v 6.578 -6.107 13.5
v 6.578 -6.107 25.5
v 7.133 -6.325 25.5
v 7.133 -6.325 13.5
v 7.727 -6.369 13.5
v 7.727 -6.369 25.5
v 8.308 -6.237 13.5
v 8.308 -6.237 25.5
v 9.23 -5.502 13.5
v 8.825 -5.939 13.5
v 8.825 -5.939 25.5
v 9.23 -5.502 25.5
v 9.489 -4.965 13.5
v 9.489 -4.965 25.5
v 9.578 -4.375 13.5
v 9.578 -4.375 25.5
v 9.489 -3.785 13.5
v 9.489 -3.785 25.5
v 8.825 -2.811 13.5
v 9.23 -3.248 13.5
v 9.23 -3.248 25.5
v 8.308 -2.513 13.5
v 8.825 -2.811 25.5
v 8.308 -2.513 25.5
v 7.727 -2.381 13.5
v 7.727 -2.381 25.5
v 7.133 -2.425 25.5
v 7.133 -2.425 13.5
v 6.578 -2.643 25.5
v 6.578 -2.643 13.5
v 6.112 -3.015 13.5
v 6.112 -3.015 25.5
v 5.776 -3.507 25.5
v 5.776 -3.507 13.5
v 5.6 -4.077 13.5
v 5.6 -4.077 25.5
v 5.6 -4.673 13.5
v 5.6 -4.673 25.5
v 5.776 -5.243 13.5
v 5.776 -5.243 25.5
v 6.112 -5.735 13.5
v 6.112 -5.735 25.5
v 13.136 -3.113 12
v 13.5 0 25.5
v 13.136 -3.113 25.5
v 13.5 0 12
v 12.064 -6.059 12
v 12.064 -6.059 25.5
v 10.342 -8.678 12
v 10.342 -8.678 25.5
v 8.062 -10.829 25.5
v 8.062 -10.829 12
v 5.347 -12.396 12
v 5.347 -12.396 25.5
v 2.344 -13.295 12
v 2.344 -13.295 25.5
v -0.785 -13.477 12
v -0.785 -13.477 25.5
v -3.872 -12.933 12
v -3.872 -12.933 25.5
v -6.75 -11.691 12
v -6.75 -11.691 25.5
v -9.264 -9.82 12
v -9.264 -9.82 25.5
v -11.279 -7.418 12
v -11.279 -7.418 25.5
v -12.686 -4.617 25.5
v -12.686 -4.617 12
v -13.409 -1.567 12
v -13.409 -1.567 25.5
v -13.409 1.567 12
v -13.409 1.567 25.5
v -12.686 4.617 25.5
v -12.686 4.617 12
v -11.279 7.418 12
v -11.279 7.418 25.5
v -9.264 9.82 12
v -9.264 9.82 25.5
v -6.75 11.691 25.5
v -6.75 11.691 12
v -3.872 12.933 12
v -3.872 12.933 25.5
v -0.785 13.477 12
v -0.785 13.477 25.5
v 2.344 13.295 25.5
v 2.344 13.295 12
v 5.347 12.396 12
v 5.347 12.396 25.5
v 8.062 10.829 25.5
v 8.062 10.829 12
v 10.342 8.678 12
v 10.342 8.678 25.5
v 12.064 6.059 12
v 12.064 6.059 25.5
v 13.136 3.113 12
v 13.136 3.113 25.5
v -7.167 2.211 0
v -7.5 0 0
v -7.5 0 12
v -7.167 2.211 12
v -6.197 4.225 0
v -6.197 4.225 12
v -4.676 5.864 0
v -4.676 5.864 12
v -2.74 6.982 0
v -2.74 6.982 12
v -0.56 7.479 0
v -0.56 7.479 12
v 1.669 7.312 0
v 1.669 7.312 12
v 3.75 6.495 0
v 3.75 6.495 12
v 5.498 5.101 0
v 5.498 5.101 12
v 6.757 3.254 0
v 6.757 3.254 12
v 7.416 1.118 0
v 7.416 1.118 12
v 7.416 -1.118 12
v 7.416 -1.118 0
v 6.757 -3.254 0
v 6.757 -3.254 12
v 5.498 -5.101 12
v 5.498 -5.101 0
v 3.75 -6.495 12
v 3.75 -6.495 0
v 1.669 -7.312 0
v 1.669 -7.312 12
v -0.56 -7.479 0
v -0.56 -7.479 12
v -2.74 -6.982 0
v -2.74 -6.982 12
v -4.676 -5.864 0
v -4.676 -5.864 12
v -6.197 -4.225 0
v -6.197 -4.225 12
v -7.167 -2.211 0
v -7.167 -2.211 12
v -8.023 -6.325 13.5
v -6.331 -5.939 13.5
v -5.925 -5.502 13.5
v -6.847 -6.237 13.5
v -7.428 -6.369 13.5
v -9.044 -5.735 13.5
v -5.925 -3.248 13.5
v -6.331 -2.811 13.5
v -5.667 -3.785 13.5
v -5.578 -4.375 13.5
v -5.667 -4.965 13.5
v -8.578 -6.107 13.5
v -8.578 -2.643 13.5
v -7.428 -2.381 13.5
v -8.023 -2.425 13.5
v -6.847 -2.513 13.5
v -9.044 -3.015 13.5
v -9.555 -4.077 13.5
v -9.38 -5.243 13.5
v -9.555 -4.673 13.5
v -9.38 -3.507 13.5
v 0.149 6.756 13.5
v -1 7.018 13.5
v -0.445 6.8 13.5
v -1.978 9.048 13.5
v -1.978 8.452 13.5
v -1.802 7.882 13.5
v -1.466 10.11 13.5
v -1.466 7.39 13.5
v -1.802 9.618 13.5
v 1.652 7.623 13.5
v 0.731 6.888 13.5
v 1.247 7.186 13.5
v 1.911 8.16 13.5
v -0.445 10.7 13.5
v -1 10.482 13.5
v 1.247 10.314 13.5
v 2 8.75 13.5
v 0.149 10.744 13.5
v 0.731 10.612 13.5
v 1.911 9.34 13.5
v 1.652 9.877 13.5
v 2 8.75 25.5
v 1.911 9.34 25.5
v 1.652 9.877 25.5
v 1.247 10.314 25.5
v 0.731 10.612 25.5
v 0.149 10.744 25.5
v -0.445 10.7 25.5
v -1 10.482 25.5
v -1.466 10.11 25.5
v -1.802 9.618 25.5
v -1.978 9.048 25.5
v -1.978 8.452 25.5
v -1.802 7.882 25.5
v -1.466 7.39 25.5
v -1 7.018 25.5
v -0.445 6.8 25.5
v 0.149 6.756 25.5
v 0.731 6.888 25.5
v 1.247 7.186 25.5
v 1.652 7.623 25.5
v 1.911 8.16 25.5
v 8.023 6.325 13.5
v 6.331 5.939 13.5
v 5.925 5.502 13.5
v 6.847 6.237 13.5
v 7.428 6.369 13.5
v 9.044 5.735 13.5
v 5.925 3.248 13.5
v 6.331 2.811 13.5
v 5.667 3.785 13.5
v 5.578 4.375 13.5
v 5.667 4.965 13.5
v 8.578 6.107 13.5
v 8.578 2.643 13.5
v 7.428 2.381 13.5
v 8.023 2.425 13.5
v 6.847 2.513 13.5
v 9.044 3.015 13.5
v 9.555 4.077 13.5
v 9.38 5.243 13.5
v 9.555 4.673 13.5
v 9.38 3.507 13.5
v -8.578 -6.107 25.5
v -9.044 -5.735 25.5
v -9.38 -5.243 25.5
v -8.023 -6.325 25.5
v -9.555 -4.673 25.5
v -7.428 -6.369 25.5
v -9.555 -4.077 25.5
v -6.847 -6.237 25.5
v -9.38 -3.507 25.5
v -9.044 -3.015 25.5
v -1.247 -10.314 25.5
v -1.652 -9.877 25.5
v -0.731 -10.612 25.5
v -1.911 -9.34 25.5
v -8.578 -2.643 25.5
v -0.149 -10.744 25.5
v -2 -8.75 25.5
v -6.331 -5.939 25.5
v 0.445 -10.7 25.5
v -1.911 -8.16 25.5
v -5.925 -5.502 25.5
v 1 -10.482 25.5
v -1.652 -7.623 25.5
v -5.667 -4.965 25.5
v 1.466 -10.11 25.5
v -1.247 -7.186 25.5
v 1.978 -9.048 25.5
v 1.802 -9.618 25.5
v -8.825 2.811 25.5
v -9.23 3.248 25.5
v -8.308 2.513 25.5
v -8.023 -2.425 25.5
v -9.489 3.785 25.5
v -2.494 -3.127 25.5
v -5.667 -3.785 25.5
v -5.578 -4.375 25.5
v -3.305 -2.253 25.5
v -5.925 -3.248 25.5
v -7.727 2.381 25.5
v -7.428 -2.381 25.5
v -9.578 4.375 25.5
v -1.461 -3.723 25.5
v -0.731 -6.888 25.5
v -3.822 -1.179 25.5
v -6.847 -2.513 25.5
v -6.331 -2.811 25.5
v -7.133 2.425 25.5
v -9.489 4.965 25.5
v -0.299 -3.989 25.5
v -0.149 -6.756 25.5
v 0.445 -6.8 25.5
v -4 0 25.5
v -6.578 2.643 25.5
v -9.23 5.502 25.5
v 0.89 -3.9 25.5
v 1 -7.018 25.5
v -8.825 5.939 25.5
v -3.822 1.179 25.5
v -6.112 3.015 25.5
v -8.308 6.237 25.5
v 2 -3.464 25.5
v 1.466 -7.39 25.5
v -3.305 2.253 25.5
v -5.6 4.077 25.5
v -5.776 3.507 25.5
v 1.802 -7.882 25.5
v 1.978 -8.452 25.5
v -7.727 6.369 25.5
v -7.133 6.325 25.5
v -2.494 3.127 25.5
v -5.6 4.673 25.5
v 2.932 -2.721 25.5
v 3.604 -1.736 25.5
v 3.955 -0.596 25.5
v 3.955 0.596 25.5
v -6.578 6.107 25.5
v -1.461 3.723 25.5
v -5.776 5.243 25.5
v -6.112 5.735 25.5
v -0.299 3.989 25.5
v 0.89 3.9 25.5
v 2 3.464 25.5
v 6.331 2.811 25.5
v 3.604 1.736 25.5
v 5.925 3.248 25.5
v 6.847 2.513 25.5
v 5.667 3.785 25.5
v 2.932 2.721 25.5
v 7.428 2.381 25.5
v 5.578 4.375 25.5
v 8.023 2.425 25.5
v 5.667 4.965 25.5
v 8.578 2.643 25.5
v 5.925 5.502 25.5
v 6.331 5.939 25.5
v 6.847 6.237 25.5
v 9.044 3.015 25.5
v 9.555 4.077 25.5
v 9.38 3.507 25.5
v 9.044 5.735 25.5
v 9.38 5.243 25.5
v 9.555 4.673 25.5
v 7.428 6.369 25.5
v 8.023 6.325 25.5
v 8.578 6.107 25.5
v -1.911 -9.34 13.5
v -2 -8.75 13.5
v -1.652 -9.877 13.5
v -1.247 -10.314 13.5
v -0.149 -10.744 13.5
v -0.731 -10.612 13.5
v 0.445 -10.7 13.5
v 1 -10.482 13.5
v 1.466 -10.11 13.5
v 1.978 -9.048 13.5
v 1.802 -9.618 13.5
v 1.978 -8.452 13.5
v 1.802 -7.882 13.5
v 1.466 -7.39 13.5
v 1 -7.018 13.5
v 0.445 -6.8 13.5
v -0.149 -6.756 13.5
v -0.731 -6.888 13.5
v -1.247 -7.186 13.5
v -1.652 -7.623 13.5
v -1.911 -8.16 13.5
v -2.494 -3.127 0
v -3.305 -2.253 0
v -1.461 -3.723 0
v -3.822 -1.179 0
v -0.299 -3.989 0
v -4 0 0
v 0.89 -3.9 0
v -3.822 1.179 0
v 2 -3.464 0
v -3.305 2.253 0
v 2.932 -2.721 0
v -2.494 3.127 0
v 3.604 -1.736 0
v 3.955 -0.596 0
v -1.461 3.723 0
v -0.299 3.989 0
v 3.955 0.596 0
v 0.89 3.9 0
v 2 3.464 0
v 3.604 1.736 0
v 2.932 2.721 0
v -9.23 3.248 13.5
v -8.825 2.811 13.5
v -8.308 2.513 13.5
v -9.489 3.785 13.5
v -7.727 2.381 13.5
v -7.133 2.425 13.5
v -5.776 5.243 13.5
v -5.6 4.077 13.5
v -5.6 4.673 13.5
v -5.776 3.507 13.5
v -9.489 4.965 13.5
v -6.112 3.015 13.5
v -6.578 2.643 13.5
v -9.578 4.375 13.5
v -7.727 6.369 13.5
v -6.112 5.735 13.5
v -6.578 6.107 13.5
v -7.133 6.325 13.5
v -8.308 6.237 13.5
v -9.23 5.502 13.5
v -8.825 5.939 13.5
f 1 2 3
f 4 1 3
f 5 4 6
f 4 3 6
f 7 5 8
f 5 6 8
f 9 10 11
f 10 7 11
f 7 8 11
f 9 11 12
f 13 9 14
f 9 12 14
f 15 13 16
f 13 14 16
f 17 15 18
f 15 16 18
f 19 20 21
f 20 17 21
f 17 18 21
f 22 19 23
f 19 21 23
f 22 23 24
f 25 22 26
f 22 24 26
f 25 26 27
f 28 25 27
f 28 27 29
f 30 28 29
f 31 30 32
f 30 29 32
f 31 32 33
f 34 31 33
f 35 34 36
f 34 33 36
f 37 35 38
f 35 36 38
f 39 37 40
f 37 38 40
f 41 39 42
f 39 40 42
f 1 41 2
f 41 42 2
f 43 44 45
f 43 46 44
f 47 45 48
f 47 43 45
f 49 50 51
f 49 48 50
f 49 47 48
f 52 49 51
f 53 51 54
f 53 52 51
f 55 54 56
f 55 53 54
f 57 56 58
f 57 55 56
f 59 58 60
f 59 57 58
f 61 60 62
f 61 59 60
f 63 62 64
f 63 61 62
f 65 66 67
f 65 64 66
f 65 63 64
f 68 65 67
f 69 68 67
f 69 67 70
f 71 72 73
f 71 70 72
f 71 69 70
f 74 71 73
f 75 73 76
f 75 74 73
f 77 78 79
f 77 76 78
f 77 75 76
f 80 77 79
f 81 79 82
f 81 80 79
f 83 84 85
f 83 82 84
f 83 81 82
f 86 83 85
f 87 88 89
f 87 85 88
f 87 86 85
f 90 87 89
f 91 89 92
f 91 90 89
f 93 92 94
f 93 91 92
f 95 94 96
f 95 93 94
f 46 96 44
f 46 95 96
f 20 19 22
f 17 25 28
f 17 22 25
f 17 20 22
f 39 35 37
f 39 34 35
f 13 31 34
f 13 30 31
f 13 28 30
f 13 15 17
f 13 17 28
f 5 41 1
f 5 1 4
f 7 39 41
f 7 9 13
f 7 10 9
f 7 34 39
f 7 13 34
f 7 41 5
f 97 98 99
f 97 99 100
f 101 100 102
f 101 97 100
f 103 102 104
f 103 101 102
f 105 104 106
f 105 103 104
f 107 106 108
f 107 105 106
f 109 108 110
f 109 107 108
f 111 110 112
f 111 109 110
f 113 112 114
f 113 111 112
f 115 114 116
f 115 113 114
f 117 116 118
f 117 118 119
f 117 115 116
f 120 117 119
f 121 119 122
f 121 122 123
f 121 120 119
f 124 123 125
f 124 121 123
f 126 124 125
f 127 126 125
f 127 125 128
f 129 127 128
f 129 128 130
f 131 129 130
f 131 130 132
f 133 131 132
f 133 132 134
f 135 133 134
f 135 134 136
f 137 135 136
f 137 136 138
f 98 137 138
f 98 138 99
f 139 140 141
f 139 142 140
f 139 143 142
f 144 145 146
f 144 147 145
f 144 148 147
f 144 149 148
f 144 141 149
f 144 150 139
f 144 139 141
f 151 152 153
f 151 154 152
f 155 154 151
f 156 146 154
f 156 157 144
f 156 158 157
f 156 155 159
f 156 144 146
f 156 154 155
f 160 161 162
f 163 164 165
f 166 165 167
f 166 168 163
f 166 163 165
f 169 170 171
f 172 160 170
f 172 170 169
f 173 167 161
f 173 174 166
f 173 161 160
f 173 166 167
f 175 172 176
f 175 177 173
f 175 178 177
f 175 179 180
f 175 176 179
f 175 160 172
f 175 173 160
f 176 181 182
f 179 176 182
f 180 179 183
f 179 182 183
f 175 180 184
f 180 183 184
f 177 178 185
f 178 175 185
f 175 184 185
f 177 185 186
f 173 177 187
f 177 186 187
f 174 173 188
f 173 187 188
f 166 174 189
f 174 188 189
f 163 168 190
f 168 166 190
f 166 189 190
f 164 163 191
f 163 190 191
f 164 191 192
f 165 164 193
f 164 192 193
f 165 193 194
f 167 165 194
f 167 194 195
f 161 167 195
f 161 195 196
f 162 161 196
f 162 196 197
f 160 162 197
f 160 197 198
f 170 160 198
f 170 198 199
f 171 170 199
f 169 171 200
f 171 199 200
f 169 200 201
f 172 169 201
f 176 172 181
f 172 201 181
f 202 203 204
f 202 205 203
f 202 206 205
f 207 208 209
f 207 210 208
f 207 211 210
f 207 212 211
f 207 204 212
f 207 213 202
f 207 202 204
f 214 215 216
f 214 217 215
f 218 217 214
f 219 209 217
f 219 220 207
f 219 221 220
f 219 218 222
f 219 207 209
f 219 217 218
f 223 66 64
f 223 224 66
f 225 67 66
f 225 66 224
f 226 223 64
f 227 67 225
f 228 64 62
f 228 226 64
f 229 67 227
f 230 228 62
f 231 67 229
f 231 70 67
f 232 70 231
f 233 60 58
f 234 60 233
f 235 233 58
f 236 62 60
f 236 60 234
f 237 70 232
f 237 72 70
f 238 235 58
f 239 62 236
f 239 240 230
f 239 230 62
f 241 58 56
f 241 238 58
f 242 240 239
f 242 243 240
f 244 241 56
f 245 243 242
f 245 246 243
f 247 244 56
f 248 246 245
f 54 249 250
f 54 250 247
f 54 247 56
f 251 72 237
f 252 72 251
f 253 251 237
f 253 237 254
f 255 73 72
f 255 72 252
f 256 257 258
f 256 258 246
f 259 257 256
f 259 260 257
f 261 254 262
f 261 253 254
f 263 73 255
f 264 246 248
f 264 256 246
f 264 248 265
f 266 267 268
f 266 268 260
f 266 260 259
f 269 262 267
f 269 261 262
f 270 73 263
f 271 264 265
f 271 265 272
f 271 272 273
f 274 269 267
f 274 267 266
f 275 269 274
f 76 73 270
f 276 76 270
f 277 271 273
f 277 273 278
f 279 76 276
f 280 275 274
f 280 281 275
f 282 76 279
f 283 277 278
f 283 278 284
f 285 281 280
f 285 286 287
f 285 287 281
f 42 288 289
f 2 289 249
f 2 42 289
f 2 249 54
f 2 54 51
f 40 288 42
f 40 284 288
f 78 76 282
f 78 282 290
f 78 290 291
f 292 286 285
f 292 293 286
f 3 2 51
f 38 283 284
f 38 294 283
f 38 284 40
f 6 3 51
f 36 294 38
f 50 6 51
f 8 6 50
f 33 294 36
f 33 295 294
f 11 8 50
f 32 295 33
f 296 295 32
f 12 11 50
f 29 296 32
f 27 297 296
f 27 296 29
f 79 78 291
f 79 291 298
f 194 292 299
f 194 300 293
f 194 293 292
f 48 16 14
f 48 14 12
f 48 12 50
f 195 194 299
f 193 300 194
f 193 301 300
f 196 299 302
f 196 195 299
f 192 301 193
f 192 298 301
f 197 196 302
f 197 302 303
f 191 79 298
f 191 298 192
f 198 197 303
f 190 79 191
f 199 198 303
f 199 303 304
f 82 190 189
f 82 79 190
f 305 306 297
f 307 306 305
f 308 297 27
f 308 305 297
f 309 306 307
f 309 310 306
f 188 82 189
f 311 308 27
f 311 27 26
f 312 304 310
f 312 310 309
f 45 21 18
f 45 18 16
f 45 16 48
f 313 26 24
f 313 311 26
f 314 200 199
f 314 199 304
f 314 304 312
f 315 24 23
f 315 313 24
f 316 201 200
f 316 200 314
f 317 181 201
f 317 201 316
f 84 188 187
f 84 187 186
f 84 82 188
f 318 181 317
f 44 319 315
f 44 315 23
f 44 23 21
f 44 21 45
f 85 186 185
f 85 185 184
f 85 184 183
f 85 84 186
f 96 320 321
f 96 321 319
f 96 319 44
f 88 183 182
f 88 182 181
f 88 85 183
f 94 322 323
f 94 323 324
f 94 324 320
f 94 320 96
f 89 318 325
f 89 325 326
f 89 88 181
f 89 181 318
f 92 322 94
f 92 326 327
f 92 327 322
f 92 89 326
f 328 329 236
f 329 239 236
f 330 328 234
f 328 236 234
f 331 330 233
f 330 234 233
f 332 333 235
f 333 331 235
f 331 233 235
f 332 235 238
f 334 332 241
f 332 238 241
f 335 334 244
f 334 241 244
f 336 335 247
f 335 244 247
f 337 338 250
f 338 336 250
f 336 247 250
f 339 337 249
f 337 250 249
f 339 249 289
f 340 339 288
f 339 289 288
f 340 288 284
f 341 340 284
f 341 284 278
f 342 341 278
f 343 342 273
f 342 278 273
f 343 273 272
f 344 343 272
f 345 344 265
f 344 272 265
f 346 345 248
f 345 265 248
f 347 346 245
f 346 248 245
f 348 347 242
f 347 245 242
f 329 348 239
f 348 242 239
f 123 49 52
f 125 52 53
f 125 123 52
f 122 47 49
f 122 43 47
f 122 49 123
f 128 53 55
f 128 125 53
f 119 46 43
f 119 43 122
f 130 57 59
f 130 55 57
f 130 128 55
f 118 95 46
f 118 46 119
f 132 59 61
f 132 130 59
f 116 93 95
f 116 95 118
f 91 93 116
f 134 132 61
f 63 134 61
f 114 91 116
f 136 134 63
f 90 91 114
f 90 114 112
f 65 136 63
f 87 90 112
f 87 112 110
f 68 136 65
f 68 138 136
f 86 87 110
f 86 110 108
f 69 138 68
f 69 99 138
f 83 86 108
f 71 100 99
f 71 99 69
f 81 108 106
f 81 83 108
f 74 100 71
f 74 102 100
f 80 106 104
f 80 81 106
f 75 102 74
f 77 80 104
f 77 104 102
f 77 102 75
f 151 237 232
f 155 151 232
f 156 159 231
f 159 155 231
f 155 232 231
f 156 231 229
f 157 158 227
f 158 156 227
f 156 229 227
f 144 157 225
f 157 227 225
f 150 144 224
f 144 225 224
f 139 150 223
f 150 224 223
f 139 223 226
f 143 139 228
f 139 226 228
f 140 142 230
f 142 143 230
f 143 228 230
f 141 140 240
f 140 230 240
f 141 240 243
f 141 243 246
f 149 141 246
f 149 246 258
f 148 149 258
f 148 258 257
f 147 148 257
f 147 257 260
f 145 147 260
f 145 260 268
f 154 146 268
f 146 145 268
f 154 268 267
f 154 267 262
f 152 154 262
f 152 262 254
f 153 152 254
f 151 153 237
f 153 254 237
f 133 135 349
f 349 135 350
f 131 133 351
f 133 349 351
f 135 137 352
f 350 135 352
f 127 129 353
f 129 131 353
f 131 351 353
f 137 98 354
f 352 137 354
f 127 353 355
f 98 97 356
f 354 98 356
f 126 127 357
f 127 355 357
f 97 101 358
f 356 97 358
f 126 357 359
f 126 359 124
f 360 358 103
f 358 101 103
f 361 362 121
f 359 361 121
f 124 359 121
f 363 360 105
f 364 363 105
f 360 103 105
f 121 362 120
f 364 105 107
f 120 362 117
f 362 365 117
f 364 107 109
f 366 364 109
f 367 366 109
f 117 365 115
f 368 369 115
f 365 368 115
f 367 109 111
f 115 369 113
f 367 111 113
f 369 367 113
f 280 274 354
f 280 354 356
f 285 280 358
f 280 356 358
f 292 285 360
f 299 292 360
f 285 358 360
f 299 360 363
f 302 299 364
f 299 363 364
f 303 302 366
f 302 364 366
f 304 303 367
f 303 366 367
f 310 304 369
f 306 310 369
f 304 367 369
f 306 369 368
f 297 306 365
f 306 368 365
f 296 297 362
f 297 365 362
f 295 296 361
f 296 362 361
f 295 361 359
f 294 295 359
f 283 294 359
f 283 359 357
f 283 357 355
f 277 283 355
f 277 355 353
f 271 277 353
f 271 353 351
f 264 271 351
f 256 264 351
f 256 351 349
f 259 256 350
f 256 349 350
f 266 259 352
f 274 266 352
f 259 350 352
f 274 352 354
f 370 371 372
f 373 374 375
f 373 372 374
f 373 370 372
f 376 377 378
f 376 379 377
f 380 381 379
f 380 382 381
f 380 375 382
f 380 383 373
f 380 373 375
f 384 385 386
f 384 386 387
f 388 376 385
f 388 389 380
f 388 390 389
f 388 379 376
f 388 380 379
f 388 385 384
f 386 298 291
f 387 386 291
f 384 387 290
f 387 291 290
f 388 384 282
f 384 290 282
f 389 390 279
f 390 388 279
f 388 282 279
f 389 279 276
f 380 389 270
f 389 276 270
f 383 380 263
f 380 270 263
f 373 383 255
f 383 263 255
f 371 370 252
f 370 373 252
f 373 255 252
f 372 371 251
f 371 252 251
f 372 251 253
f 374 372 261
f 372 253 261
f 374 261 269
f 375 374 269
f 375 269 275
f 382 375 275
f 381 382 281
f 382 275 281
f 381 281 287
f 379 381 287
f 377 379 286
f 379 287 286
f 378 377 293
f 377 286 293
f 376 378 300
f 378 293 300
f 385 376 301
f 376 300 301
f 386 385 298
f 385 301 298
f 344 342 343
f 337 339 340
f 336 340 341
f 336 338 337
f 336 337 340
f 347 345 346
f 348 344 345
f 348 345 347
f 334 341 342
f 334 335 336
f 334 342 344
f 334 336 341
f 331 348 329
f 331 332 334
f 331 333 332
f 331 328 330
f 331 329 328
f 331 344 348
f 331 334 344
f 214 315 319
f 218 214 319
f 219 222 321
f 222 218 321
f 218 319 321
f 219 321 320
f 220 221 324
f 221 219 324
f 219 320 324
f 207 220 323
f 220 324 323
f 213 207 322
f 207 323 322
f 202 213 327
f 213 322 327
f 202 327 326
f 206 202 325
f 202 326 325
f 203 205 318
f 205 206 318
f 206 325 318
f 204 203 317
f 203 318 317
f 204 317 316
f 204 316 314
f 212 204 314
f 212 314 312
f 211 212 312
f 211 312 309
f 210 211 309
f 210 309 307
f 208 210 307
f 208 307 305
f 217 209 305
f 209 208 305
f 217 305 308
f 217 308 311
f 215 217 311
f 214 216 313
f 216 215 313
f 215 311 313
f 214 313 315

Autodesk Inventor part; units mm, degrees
ref_plane "YZ Plane" through (0, 0, 0) normal (1, 0, 0) x (0, 1, 0)
ref_plane "XZ Plane" through (0, 0, 0) normal (0, 1, 0) x (-1, 0, 0)
ref_plane "XY Plane" through (0, 0, 0) normal (0, 0, 1) x (1, 0, 0)
sketch "Szkic1" plane through (0, 0, 0) normal (0, 0, 1) x (1, 0, 0)
  circle A0 centre (0, 0) radius 13.5
  dimension "d0" = 27
extrude "Wyciągnięcie proste1" add sketch "Szkic1" along normal blind 25.5
sketch "Szkic2" plane through (0, 0, 0) normal (0, 0, -1) x (-1, 0, 0)
  circle A0 centre (0, 0) radius 7.5
  circle A1 centre (0, 0) radius 13.5 projected
  dimension "d3" = 15
extrude "Wyciągnięcie proste2" cut sketch "Szkic2" against normal blind 12
sketch "Szkic3" plane through (0, 0, 0) normal (0, 0, -1) x (-1, 0, 0)
  circle A0 centre (0, 0) radius 4
  dimension "d6" = 8
extrude "Wyciągnięcie proste3" cut sketch "Szkic3" against normal up to next
sketch "Szkic4" plane through (0, 0, 25.5) normal (0, 0, 1) x (1, 0, 0)
  circle A0 centre (0, 0) radius 4 projected
  circle A1 centre (0, 0) radius 13.5 projected
  line L0 (0, 0) -> (0, 8.75)
  circle A2 centre (0, 8.75) radius 2
  dimension "d11" = 8.75
  dimension "d12" = 4
extrude "Wyciągnięcie proste4" cut sketch "Szkic4" against normal blind 12 contours A2
pattern_circular "Szyk kołowy1" count 6 over 360 about axis through (0, 0, 0) along (0, 0, 1) of "Wyciągnięcie proste4"
thread "Gwint1" size "M4x0.7" class "6H" standard "ANSI Metric M Profile" full length
thread "Gwint2" size "M4x0.7" class "6H" standard "ANSI Metric M Profile" full length
thread "Gwint3" size "M4x0.7" class "6H" standard "ANSI Metric M Profile" full length
thread "Gwint4" size "M4x0.7" class "6H" standard "ANSI Metric M Profile" full length
thread "Gwint5" size "M4x0.7" class "6H" standard "ANSI Metric M Profile" full length
thread "Gwint6" size "M4x0.7" class "6H" standard "ANSI Metric M Profile" full length
properties part number "Tuleja zaciskowo rozprężna RCK BK 80 8x15 Clampex"
